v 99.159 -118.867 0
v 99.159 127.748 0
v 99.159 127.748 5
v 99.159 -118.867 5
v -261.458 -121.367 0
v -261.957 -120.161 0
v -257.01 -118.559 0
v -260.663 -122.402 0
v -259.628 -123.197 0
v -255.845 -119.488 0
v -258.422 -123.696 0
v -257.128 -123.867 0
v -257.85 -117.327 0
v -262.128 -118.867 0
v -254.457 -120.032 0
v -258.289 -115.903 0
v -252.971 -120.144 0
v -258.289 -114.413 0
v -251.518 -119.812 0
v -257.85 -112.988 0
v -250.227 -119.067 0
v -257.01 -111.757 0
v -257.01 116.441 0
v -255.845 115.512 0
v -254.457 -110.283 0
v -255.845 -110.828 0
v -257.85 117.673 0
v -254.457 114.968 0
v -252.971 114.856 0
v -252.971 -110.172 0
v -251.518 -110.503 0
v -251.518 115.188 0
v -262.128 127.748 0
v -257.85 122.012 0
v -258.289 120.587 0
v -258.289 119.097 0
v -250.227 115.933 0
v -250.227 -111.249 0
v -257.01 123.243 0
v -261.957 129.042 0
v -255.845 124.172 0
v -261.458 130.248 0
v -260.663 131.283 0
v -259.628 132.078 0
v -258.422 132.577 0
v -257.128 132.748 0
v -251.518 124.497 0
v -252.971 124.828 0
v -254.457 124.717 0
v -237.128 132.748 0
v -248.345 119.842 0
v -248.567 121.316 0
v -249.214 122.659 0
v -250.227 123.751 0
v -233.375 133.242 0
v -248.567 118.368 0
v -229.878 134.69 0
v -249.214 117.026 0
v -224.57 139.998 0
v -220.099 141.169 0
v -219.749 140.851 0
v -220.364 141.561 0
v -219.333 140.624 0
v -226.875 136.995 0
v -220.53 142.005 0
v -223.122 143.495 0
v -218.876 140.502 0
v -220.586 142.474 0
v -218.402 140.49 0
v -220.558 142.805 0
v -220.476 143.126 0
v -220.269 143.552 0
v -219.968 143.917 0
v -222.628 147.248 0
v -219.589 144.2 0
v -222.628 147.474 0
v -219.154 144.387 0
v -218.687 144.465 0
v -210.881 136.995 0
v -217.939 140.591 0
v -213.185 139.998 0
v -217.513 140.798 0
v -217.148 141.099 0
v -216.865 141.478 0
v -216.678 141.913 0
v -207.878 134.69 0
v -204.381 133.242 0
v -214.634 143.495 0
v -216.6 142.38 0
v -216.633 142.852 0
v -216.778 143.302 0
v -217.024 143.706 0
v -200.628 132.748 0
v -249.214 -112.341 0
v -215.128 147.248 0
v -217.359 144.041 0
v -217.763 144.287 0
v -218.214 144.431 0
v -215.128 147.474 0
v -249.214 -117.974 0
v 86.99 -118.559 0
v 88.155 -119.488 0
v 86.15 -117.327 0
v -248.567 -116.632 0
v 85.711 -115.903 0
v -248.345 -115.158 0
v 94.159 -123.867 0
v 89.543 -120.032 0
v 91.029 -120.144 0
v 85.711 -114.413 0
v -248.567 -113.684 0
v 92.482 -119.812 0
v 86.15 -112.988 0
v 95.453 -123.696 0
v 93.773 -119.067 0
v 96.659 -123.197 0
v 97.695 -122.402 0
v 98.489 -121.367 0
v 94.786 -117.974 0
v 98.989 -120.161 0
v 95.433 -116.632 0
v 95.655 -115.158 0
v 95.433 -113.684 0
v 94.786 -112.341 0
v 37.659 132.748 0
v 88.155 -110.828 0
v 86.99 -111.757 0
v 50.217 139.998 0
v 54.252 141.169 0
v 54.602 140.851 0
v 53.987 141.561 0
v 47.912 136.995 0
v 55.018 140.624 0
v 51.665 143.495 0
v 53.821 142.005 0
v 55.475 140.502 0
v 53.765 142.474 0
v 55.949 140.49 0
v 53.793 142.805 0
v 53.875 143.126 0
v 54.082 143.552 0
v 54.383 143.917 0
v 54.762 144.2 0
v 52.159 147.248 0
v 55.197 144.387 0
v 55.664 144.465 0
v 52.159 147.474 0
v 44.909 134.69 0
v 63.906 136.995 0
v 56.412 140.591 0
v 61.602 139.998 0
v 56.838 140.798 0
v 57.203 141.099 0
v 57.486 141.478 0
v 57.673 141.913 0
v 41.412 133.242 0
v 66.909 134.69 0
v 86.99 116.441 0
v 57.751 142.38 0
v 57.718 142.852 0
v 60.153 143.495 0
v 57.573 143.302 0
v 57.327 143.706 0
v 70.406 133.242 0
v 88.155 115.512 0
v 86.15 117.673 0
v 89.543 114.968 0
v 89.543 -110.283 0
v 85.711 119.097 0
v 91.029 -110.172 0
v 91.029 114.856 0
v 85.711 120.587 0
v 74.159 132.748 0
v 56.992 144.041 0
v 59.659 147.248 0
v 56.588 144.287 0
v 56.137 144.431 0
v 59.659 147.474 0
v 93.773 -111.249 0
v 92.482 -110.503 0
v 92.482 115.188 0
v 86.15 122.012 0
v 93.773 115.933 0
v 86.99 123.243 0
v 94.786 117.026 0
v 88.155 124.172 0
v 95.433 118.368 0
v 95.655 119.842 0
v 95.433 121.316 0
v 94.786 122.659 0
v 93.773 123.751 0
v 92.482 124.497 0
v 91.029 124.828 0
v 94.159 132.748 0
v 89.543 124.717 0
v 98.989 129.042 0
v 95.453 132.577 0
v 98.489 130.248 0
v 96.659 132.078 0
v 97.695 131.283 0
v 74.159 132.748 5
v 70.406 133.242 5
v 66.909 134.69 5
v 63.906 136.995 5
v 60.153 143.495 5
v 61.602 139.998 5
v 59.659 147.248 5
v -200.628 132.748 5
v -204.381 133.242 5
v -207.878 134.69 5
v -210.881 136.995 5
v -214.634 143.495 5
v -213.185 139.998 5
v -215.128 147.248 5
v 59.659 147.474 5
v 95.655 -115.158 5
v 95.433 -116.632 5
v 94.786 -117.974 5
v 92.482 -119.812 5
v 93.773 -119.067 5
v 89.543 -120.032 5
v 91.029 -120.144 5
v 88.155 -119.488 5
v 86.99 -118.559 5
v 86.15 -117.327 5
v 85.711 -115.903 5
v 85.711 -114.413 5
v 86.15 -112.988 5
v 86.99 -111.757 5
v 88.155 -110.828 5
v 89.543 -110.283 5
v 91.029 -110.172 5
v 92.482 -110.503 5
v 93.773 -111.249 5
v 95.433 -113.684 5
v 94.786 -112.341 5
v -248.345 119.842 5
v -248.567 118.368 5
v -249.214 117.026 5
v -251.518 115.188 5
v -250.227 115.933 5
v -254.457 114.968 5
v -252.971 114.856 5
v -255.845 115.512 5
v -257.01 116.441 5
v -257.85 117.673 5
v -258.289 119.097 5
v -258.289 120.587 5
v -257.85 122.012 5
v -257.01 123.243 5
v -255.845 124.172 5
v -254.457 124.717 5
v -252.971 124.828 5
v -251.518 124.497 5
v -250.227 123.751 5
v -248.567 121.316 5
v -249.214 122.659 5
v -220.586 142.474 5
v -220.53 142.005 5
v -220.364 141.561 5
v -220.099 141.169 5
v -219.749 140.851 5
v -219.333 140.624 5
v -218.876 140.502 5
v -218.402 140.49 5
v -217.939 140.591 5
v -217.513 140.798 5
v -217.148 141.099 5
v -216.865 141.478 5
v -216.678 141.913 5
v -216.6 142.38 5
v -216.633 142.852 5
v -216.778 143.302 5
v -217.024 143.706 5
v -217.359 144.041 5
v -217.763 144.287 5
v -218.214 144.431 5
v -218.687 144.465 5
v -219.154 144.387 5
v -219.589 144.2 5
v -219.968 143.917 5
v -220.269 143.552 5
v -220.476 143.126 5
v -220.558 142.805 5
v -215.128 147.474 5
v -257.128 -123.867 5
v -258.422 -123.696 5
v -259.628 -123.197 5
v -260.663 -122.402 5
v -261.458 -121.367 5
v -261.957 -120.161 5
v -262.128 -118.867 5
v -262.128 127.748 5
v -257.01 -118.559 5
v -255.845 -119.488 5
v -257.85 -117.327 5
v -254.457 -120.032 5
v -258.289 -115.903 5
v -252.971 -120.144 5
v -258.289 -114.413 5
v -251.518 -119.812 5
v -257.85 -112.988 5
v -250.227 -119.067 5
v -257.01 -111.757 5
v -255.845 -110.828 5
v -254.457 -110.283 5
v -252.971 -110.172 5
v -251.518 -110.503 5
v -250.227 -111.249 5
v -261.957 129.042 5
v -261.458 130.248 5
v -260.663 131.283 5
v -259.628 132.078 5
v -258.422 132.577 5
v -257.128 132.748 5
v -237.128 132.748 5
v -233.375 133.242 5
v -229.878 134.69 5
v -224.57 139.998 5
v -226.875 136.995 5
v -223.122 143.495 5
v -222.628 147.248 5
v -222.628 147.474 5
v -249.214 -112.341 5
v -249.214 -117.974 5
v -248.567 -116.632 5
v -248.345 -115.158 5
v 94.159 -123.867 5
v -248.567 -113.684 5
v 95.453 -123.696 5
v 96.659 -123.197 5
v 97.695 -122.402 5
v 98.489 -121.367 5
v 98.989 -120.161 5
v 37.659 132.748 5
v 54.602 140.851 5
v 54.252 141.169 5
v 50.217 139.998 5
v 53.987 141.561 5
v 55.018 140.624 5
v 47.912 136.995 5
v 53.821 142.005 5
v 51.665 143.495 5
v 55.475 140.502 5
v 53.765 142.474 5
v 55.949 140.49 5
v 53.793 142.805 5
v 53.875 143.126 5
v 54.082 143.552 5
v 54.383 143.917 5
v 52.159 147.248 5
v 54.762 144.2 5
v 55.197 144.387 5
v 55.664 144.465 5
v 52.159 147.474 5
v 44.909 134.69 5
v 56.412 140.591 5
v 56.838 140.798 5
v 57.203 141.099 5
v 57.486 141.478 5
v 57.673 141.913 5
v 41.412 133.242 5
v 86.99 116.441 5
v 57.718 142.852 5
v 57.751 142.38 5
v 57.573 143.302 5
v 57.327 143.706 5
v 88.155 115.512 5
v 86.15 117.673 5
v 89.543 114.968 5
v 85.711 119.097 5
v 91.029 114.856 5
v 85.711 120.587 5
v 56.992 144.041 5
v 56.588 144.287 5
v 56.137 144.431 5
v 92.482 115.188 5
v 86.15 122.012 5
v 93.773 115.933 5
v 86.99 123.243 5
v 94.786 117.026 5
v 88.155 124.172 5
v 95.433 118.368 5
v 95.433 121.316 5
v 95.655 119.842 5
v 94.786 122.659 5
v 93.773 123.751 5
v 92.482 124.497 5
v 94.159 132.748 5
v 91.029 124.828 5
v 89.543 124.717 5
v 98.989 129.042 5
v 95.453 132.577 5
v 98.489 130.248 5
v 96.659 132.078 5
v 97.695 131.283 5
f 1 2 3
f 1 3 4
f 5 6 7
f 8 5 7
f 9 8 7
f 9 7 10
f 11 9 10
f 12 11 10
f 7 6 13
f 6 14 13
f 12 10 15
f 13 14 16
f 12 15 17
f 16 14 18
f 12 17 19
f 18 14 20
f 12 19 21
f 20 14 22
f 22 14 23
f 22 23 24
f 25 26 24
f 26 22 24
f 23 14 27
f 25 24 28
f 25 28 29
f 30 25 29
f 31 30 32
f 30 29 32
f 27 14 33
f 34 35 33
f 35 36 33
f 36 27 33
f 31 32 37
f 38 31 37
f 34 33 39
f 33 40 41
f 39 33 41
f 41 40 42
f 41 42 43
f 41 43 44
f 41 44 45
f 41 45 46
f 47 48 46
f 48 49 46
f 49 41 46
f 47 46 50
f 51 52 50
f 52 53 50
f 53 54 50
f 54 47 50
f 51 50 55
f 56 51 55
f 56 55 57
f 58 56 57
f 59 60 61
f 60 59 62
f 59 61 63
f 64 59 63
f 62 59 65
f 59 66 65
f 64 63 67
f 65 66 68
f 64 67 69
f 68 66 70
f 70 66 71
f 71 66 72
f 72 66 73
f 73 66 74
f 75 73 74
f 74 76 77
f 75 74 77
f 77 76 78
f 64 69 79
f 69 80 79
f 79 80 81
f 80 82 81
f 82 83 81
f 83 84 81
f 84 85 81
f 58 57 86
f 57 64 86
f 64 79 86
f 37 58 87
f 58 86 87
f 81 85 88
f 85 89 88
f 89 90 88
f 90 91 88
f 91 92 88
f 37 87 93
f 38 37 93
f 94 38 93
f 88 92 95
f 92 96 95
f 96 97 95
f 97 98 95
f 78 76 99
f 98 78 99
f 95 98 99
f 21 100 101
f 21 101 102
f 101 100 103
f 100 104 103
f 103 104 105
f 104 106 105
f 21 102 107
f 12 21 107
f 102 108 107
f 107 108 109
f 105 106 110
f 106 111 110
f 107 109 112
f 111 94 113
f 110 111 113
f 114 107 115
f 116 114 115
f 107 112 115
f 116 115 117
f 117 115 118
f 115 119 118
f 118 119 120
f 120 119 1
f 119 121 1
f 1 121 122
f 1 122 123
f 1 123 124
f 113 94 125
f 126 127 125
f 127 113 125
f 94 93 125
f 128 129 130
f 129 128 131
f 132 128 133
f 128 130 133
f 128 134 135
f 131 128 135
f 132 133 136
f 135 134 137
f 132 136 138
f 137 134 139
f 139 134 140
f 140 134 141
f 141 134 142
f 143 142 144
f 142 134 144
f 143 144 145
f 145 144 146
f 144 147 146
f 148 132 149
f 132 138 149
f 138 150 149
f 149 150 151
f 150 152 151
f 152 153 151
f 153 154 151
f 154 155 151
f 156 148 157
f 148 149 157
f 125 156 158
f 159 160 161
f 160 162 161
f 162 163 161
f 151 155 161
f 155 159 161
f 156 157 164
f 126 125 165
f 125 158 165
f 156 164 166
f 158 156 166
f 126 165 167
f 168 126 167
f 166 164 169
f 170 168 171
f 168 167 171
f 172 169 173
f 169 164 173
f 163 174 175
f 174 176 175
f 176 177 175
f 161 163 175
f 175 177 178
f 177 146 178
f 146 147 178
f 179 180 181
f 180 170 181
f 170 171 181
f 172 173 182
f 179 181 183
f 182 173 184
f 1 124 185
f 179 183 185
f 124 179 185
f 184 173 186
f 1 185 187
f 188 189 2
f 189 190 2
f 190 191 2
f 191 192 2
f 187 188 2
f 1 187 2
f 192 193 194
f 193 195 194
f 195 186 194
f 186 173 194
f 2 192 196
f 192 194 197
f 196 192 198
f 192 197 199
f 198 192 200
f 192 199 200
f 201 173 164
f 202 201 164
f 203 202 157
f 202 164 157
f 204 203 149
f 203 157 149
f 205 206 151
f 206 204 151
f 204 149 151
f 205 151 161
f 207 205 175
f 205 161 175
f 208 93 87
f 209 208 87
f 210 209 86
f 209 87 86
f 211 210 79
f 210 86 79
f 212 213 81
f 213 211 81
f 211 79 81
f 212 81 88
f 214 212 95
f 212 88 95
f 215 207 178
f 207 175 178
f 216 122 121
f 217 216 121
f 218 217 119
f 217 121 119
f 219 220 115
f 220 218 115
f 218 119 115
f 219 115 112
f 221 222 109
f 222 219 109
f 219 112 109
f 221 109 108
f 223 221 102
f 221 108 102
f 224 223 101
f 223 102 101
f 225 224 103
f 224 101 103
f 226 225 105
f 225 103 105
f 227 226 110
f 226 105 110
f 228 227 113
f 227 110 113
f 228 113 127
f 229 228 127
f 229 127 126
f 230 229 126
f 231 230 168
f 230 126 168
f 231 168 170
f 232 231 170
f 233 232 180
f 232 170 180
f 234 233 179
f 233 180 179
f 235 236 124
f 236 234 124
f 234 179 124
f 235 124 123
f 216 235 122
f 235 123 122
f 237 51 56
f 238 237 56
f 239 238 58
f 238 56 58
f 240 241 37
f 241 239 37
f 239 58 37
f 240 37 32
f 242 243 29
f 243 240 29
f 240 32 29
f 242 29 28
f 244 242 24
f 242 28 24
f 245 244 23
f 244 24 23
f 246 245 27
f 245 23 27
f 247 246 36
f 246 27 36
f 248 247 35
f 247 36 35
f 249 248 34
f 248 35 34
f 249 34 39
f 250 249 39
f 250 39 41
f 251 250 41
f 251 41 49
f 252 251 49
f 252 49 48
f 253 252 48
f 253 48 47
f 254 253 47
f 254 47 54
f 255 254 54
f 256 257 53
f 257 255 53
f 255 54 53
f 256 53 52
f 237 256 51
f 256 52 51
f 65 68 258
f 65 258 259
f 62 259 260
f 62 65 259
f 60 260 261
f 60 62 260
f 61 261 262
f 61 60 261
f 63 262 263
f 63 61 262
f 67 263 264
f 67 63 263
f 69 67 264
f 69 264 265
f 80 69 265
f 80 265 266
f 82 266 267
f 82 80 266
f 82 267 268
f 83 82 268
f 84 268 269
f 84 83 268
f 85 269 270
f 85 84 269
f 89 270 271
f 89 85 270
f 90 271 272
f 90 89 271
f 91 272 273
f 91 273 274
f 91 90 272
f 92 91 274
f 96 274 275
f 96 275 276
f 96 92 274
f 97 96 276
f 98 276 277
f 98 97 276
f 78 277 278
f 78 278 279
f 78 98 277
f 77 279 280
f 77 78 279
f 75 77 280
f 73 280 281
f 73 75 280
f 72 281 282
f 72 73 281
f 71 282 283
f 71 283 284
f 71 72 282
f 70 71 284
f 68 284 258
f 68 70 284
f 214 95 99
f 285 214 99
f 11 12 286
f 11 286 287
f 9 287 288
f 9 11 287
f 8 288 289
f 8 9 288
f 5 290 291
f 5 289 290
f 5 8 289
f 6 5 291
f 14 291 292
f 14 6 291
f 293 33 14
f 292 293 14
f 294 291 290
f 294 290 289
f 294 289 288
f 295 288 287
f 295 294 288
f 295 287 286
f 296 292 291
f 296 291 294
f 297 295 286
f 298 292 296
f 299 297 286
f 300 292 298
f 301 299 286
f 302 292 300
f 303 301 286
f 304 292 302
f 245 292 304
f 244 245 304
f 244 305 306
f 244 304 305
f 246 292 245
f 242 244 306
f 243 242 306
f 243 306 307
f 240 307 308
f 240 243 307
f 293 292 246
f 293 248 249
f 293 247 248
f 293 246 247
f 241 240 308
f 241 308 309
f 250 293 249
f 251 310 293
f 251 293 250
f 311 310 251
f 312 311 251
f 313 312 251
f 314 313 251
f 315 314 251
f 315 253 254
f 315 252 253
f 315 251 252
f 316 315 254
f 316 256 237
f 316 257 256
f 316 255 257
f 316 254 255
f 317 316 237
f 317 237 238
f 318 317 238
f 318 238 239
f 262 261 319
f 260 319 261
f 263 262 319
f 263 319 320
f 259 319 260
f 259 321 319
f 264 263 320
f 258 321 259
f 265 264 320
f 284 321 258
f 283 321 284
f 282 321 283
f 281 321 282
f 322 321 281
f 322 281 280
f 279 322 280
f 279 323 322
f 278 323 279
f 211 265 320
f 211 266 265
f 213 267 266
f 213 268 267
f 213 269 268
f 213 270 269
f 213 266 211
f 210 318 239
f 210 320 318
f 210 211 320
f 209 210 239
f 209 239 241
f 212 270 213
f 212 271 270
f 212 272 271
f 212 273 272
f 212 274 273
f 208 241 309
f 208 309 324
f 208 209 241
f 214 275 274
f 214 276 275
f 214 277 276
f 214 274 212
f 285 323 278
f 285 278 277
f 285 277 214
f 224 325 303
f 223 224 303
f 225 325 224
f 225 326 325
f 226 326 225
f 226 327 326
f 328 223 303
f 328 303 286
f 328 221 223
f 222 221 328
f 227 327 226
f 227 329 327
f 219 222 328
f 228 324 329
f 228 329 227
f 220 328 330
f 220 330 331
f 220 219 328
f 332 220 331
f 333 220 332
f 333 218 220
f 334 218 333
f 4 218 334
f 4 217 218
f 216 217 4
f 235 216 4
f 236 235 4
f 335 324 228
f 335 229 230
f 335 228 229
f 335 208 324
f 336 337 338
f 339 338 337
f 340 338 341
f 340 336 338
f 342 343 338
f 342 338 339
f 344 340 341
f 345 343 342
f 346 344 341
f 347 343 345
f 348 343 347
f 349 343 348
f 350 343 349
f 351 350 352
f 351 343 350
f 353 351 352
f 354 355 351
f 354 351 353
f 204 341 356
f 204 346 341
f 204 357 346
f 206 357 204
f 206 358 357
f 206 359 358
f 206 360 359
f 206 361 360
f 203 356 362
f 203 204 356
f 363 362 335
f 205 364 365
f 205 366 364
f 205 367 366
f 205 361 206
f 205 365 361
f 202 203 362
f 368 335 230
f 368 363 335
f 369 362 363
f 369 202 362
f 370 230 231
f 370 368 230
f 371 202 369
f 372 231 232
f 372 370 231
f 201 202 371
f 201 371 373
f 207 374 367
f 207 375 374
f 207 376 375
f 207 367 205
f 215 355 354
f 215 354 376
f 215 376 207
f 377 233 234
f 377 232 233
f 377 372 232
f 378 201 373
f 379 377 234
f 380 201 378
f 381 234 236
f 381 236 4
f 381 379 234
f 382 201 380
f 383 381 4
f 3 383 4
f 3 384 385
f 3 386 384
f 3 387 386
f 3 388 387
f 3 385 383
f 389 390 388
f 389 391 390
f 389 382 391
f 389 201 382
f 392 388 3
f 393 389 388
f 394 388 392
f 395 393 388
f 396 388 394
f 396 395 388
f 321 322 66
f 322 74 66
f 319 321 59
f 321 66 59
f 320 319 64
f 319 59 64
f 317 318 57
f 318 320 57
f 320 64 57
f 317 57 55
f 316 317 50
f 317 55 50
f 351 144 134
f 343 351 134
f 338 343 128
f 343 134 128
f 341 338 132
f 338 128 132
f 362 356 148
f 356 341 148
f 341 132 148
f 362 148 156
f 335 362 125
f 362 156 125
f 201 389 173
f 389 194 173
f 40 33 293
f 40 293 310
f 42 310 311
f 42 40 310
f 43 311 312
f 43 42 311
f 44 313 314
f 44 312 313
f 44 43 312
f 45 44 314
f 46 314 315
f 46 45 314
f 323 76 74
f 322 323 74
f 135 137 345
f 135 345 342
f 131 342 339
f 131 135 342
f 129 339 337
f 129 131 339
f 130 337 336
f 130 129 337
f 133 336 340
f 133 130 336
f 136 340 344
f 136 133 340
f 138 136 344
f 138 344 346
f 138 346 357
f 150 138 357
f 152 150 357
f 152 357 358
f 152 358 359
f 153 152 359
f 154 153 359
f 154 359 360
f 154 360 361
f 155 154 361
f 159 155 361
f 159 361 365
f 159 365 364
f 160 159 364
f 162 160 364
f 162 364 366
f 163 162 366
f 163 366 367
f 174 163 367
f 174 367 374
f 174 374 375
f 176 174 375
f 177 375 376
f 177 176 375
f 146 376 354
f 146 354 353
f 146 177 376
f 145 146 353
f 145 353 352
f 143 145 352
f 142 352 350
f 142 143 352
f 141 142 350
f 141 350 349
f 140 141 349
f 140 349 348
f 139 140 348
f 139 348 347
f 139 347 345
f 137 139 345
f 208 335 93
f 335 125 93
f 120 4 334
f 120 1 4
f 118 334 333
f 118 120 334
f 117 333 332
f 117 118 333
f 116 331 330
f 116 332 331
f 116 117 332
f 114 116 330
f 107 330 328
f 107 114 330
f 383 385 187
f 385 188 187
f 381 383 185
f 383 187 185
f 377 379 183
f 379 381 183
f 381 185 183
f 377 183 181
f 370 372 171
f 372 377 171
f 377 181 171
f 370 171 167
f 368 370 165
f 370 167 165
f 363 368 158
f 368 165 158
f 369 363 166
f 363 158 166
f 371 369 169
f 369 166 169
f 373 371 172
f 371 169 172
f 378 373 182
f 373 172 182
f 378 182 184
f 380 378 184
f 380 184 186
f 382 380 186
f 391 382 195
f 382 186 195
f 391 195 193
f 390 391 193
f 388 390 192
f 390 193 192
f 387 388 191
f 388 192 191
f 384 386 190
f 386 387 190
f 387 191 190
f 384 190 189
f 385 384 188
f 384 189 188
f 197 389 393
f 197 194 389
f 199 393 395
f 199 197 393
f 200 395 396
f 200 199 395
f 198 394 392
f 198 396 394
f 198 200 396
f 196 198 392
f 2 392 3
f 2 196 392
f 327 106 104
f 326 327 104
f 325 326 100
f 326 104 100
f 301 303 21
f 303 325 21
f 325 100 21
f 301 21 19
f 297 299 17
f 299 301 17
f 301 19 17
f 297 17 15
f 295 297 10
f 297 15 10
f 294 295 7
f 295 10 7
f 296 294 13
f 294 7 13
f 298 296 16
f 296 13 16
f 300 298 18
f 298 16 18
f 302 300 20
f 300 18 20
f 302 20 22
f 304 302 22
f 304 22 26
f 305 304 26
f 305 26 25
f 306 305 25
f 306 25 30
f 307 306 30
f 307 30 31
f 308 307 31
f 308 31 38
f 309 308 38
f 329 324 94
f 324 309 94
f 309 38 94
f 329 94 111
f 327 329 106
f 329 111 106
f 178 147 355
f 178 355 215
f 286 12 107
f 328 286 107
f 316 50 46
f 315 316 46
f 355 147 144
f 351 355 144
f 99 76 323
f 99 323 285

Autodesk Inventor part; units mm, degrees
ref_plane "YZ Plane" through (0, 0, 0) normal (1, 0, 0) x (0, 1, 0)
ref_plane "XZ Plane" through (0, 0, 0) normal (0, 1, 0) x (-1, 0, 0)
ref_plane "XY Plane" through (0, 0, 0) normal (0, 0, 1) x (1, 0, 0)
sketch "Sketch1" plane through (0, 0, 0) normal (0, 0, 1) x (1, 0, 0)
  ellipse E0 centre (-218.5917, 142.4744) end of major axis (-220.586, 142.4744) minor radius 1.993
  ellipse E1 centre (55.7593, 142.4744) end of major axis (53.765, 142.4744) minor radius 1.993
  line L0 (-222.6278, 147.4744) -> (-215.1278, 147.4744)
  line L1 (52.1593, 147.4744) -> (59.6593, 147.4744)
  line L2 (99.1593, 127.7477) -> (99.1593, -118.8668)
  line L3 (-262.1278, 127.7477) -> (-262.1278, -118.8668)
  line L4 (-257.1278, -123.8668) -> (94.1593, -123.8668)
  line L5 (94.1593, 132.7477) -> (74.1593, 132.7477)
  line L6 (59.6593, 147.2477) -> (59.6593, 147.4744)
  line L7 (52.1593, 147.4744) -> (52.1593, 147.2477)
  line L8 (-215.1278, 147.2477) -> (-215.1278, 147.4744)
  line L9 (-222.6278, 147.4744) -> (-222.6278, 147.2477)
  line L10 (-237.1278, 132.7477) -> (-257.1278, 132.7477)
  arc A0 (59.6593, 147.2477) -> (74.1593, 132.7477) centre (74.1593, 147.2477) ccw
  arc A1 (37.6593, 132.7477) -> (52.1593, 147.2477) centre (37.6593, 147.2477) ccw
  arc A2 (-215.1278, 147.2477) -> (-200.6278, 132.7477) centre (-200.6278, 147.2477) ccw
  arc A3 (-237.1278, 132.7477) -> (-222.6278, 147.2477) centre (-237.1278, 147.2477) ccw
  line L11 (37.6593, 132.7477) -> (-200.6278, 132.7477)
  arc A4 (94.1593, -123.8668) -> (99.1593, -118.8668) centre (94.1593, -118.8668) ccw
  arc A5 (-262.1278, -118.8668) -> (-257.1278, -123.8668) centre (-257.1278, -118.8668) ccw
  arc A6 (-257.1278, 132.7477) -> (-262.1278, 127.7477) centre (-257.1278, 127.7477) ccw
  arc A7 (99.1593, 127.7477) -> (94.1593, 132.7477) centre (94.1593, 127.7477) ccw
  circle A8 centre (90.6553, 119.8422) radius 5
  circle A9 centre (90.6553, -115.1578) radius 5
  circle A10 centre (-253.3447, -115.1578) radius 5
  circle A11 centre (-253.3447, 119.8422) radius 5
  point P0 (-262.1278, -108.8668)
  point P1 (-247.1278, -123.8668)
  point P2 (-262.1278, 112.7477)
  point P3 (99.1593, 112.7477)
  point P4 (59.6593, 132.7477)
  point P5 (-222.6278, 132.7477)
  point P6 (-242.1278, 132.7477)
  point P7 (79.1593, 132.7477)
  point P8 (59.6593, 147.361)
  point P9 (84.1593, -123.8668)
  point P10 (99.1593, -108.8668)
  dimension "d3" = 7.5
  dimension "d4" = 7.5
  dimension "d18" = 5
  dimension "d28" = 14.7267
  dimension "d29" = 14.5
  dimension "d33" = 5
  dimension "d34" = 4.7733
  dimension "d36" = 5
  dimension "d37" = 5
  dimension "d39" = 5
extrude "Extrusion1" add sketch "Sketch1" along normal blind 5
properties part number "back plate" material "Nylon 6/6"
